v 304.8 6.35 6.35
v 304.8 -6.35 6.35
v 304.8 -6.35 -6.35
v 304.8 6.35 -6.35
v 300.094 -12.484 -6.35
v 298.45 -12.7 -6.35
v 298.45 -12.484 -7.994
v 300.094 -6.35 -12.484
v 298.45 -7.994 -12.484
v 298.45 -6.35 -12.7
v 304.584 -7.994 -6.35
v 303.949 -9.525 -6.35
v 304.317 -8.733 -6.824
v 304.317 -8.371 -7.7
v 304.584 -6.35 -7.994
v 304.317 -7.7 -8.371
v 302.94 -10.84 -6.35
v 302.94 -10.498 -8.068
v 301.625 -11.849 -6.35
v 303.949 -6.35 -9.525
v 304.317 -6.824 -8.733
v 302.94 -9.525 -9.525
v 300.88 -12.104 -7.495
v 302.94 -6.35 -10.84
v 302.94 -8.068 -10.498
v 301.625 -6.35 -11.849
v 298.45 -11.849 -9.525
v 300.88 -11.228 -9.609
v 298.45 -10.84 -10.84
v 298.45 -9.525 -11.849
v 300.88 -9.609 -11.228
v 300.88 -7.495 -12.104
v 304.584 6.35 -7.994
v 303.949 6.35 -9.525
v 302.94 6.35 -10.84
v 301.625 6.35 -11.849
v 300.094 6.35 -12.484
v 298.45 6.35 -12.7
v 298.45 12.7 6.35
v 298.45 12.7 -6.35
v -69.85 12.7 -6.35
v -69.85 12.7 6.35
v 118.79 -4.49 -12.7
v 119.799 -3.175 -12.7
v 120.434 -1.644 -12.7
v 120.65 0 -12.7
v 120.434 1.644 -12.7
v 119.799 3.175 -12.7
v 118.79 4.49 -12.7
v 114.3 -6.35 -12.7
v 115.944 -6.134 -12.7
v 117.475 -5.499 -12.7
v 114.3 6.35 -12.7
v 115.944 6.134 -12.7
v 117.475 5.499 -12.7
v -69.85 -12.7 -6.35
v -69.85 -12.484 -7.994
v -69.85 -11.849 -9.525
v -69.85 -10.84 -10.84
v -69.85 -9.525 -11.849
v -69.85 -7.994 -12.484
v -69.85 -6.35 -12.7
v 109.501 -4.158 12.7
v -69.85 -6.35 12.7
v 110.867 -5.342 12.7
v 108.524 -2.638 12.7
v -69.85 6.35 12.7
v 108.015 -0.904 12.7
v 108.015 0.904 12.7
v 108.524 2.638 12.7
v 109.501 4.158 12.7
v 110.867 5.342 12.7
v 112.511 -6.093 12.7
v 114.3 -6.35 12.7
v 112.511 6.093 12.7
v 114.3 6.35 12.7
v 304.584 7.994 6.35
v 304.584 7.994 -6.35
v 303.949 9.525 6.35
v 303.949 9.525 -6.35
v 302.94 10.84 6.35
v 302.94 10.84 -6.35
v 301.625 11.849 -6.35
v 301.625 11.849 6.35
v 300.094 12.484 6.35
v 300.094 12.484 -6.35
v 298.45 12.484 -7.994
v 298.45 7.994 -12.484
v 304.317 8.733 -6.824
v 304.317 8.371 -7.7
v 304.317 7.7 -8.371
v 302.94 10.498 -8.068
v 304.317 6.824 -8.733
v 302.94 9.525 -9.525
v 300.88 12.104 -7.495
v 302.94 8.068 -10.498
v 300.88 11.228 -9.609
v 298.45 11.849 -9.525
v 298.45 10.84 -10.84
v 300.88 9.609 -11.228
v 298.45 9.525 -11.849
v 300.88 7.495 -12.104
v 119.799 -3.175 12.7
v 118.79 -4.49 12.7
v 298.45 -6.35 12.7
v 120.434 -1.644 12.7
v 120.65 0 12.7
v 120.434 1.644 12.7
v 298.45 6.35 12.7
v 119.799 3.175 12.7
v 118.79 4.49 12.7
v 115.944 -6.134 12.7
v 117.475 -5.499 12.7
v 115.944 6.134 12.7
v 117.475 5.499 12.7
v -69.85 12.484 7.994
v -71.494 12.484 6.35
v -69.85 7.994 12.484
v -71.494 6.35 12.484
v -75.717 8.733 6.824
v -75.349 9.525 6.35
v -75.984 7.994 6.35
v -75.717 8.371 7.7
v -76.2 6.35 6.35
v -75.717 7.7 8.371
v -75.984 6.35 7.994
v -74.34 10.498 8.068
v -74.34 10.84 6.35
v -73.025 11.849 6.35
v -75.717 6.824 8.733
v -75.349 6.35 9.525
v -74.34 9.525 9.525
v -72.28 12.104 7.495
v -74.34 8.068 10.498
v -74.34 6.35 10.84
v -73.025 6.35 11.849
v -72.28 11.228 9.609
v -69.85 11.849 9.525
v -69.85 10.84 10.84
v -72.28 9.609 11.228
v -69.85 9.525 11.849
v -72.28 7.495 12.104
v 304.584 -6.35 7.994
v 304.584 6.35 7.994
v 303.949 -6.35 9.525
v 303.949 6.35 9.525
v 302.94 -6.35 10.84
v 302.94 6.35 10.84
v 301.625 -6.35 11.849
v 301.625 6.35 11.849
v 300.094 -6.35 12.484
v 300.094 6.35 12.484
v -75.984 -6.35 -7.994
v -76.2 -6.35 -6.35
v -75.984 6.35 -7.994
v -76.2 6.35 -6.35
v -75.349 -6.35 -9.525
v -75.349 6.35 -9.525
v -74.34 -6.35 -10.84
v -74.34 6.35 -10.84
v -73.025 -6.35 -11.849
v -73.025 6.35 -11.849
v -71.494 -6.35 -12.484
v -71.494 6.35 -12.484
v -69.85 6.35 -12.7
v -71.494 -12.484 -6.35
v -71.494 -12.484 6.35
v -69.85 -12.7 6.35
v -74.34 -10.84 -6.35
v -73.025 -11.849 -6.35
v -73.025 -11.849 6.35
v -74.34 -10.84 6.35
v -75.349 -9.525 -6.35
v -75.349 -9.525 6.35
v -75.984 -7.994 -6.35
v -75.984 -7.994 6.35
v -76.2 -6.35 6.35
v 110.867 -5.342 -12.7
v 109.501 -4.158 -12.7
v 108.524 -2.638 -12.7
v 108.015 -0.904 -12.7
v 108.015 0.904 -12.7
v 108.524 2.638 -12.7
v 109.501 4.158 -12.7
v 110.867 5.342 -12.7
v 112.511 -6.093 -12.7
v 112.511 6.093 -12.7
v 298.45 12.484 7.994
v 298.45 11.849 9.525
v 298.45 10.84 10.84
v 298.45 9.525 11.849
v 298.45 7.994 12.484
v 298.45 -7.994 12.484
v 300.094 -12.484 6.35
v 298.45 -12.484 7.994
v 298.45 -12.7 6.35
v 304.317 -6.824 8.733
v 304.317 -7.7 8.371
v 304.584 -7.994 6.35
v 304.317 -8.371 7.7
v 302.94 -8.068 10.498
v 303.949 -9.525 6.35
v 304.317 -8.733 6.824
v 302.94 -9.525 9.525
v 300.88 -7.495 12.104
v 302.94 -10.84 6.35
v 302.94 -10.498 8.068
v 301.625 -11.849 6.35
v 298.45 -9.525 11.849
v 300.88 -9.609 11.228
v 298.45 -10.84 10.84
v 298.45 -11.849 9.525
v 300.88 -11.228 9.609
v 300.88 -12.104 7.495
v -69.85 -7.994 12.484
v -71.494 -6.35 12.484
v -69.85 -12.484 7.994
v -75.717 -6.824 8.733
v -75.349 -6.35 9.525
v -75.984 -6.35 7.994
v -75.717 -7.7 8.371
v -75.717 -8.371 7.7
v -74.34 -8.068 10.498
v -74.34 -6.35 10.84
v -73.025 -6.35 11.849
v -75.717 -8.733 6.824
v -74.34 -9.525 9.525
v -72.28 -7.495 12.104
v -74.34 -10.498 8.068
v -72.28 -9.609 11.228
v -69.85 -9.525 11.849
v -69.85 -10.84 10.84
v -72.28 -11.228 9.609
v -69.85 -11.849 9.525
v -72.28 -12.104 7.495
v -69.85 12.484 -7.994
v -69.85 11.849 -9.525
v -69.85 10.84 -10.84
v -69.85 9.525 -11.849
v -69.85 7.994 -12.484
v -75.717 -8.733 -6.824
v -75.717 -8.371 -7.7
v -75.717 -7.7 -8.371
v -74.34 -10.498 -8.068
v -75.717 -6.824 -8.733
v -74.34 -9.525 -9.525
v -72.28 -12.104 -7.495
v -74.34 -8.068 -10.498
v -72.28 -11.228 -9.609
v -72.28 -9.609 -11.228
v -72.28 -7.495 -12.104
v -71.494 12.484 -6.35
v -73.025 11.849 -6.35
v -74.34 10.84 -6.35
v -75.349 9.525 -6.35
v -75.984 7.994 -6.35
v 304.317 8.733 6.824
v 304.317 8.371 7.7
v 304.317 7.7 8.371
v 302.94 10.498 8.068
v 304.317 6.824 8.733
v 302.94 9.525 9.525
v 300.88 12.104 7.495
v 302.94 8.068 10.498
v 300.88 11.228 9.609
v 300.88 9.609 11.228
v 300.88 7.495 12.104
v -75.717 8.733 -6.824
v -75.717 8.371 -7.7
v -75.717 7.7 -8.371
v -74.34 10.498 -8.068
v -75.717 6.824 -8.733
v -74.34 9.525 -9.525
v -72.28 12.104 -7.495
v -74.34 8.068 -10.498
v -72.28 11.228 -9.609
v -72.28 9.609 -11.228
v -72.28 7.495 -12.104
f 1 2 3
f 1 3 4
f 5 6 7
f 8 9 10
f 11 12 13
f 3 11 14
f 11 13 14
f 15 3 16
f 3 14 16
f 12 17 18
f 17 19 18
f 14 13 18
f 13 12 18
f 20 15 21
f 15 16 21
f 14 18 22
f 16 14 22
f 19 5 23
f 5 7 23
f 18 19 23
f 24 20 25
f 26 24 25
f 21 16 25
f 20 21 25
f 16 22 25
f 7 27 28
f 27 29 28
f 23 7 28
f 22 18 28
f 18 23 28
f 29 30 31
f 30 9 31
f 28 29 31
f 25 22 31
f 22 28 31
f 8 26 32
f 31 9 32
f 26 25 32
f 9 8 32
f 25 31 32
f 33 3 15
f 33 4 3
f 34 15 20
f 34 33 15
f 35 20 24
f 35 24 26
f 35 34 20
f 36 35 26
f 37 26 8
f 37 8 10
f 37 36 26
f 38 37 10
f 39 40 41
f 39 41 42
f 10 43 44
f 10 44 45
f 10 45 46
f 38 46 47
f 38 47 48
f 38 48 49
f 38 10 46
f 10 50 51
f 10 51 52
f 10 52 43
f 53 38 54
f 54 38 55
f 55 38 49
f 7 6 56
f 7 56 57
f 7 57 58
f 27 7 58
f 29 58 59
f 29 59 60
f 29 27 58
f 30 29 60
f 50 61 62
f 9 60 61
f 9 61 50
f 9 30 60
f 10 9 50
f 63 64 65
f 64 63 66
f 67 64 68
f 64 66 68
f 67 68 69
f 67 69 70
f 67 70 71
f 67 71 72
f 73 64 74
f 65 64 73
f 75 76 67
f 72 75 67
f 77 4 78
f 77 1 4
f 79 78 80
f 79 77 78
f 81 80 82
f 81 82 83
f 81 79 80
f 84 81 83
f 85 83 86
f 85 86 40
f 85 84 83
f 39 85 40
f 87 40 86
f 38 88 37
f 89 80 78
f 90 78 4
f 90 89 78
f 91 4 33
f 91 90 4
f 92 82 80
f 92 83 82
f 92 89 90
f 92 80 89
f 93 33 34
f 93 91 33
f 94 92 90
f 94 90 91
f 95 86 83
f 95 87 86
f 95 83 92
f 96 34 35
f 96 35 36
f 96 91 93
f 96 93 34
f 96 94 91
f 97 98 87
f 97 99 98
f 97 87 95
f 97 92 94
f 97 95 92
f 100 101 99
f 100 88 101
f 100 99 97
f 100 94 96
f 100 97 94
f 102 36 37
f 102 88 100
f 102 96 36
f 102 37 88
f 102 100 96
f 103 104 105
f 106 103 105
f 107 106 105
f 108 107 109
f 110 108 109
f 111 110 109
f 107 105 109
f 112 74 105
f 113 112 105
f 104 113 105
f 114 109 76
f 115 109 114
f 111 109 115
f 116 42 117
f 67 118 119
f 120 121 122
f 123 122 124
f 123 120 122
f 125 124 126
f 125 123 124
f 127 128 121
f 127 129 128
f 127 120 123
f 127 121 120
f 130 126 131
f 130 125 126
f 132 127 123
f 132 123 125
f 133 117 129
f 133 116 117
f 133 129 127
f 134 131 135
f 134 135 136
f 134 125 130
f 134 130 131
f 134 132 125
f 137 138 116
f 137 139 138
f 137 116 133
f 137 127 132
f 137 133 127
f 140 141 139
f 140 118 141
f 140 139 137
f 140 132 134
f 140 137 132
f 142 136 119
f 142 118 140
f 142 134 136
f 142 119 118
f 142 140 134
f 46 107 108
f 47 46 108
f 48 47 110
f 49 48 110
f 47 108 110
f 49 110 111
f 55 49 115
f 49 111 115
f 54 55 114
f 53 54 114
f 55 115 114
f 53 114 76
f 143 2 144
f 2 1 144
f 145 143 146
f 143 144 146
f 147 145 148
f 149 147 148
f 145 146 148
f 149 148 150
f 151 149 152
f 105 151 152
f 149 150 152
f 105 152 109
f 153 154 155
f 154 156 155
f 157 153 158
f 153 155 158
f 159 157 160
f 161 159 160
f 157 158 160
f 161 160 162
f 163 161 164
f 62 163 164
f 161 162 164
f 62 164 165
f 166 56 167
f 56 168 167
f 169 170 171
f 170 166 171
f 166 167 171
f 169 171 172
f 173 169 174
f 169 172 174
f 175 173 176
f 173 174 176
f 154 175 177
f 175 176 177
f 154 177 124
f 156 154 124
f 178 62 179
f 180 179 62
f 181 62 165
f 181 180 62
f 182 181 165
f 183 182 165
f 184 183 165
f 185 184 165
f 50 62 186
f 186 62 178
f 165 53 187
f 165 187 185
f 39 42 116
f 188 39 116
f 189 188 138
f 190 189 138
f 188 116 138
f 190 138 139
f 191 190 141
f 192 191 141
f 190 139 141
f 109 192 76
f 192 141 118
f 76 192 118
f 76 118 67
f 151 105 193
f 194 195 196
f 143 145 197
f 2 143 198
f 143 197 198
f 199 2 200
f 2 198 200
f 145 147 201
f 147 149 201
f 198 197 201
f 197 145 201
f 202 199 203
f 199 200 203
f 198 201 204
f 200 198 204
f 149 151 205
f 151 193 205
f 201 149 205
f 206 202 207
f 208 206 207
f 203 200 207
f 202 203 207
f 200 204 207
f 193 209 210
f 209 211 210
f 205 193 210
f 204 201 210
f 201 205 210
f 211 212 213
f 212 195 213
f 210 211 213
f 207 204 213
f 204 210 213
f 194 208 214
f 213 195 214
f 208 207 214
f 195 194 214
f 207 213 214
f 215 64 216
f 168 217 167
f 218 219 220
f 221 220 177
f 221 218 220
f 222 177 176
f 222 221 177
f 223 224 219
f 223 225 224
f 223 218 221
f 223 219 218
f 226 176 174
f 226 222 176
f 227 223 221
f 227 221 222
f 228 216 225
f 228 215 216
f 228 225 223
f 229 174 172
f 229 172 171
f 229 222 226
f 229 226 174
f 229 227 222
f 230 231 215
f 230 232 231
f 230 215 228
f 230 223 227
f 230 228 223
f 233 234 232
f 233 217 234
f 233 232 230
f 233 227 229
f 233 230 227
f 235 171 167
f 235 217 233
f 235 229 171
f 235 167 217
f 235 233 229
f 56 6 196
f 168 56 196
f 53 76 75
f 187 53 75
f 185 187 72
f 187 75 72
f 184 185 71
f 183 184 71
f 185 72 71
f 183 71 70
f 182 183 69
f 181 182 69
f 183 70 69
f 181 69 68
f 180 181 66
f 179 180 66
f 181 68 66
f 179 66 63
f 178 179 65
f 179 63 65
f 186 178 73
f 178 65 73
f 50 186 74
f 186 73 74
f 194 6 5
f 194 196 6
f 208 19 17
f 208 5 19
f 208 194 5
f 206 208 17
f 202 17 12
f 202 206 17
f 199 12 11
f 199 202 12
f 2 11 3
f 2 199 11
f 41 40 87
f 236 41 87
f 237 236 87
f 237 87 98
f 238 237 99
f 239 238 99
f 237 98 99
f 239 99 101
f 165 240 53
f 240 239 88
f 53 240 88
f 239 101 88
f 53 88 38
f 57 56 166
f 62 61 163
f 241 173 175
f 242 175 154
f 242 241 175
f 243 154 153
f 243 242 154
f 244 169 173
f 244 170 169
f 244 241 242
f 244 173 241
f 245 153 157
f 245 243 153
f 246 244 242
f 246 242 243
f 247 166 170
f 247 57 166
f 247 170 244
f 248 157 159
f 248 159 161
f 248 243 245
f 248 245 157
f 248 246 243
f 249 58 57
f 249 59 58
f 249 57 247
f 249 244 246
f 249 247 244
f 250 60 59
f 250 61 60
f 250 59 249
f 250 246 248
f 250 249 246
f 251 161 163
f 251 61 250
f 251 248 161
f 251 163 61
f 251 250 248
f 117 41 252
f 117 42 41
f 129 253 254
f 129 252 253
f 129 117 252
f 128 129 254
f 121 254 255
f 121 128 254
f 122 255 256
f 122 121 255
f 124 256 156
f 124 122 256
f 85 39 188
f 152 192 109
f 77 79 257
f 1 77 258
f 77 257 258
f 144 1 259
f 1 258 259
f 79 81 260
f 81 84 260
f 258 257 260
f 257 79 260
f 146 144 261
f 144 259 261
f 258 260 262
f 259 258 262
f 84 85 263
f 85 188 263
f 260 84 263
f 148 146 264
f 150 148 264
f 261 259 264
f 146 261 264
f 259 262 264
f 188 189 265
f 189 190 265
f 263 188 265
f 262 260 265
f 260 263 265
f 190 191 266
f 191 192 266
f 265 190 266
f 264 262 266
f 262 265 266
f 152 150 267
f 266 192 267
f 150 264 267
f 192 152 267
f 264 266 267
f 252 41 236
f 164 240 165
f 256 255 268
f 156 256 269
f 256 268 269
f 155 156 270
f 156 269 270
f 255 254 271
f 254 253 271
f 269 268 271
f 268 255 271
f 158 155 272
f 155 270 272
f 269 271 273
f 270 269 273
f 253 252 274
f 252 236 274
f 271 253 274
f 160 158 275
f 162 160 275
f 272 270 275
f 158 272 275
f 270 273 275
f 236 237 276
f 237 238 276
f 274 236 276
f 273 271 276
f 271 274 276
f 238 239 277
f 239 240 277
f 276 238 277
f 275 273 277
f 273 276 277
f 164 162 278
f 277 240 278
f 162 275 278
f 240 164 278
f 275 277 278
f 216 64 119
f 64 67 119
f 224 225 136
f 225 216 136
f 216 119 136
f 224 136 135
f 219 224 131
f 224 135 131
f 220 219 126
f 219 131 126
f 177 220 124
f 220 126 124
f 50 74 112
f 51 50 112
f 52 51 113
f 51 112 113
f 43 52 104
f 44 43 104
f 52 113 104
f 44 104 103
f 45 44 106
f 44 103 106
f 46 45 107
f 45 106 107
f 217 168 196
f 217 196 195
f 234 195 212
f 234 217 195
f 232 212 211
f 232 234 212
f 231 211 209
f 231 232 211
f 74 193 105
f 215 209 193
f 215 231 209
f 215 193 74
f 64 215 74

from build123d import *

# Parameters (mm, degrees)
F0_W          = 25.4
F0_H          = 25.4
F1_DEPTH      = 304.8
F1_DEPTH_BACK = 76.2
F2_R          = 6.35
F4_DEPTH      = 25.401


with BuildPart() as f1:
    # F0 (on Right) → F1 (new body, two sides)
    with BuildSketch(Plane.YZ) as f1_sk:
        Rectangle(F0_W, F0_H)
    extrude(amount=F1_DEPTH)
    extrude(f1_sk.sketch, amount=-F1_DEPTH_BACK)

    # F2
    f2_edges = [f1.edges().sort_by_distance(p)[0] for p in [
        (114.3, -12.7, 12.7),
        (114.3, 12.7, 12.7),
        (114.3, -12.7, -12.7),
        (114.3, 12.7, -12.7),
        (304.8, 12.7, 0),
        (304.8, 0, 12.7),
        (304.8, -12.7, 0),
        (304.8, 0, -12.7),
        (-76.2, 12.7, 0),
        (-76.2, 0, 12.7),
        (-76.2, -12.7, 0),
        (-76.2, 0, -12.7),
    ]]
    fillet(f2_edges, radius=F2_R)

    # F3 (on face) → F4 (cut, through all)
    with BuildSketch(Plane.XY.offset(12.7)):
        with BuildLine():
            ThreePointArc((114.2999998593, -6.35), (118.7901280108, -4.4901281103), (120.65, 0))
            ThreePointArc((120.65, 0), (118.7901280791, 4.4901280419), (114.3000000526, 6.35))
            ThreePointArc((114.3000000526, 6.35), (107.95, 9.66e-08), (114.2999998593, -6.35))
        make_face()
    extrude(amount=-F4_DEPTH, mode=Mode.SUBTRACT)


solid = f1.part
